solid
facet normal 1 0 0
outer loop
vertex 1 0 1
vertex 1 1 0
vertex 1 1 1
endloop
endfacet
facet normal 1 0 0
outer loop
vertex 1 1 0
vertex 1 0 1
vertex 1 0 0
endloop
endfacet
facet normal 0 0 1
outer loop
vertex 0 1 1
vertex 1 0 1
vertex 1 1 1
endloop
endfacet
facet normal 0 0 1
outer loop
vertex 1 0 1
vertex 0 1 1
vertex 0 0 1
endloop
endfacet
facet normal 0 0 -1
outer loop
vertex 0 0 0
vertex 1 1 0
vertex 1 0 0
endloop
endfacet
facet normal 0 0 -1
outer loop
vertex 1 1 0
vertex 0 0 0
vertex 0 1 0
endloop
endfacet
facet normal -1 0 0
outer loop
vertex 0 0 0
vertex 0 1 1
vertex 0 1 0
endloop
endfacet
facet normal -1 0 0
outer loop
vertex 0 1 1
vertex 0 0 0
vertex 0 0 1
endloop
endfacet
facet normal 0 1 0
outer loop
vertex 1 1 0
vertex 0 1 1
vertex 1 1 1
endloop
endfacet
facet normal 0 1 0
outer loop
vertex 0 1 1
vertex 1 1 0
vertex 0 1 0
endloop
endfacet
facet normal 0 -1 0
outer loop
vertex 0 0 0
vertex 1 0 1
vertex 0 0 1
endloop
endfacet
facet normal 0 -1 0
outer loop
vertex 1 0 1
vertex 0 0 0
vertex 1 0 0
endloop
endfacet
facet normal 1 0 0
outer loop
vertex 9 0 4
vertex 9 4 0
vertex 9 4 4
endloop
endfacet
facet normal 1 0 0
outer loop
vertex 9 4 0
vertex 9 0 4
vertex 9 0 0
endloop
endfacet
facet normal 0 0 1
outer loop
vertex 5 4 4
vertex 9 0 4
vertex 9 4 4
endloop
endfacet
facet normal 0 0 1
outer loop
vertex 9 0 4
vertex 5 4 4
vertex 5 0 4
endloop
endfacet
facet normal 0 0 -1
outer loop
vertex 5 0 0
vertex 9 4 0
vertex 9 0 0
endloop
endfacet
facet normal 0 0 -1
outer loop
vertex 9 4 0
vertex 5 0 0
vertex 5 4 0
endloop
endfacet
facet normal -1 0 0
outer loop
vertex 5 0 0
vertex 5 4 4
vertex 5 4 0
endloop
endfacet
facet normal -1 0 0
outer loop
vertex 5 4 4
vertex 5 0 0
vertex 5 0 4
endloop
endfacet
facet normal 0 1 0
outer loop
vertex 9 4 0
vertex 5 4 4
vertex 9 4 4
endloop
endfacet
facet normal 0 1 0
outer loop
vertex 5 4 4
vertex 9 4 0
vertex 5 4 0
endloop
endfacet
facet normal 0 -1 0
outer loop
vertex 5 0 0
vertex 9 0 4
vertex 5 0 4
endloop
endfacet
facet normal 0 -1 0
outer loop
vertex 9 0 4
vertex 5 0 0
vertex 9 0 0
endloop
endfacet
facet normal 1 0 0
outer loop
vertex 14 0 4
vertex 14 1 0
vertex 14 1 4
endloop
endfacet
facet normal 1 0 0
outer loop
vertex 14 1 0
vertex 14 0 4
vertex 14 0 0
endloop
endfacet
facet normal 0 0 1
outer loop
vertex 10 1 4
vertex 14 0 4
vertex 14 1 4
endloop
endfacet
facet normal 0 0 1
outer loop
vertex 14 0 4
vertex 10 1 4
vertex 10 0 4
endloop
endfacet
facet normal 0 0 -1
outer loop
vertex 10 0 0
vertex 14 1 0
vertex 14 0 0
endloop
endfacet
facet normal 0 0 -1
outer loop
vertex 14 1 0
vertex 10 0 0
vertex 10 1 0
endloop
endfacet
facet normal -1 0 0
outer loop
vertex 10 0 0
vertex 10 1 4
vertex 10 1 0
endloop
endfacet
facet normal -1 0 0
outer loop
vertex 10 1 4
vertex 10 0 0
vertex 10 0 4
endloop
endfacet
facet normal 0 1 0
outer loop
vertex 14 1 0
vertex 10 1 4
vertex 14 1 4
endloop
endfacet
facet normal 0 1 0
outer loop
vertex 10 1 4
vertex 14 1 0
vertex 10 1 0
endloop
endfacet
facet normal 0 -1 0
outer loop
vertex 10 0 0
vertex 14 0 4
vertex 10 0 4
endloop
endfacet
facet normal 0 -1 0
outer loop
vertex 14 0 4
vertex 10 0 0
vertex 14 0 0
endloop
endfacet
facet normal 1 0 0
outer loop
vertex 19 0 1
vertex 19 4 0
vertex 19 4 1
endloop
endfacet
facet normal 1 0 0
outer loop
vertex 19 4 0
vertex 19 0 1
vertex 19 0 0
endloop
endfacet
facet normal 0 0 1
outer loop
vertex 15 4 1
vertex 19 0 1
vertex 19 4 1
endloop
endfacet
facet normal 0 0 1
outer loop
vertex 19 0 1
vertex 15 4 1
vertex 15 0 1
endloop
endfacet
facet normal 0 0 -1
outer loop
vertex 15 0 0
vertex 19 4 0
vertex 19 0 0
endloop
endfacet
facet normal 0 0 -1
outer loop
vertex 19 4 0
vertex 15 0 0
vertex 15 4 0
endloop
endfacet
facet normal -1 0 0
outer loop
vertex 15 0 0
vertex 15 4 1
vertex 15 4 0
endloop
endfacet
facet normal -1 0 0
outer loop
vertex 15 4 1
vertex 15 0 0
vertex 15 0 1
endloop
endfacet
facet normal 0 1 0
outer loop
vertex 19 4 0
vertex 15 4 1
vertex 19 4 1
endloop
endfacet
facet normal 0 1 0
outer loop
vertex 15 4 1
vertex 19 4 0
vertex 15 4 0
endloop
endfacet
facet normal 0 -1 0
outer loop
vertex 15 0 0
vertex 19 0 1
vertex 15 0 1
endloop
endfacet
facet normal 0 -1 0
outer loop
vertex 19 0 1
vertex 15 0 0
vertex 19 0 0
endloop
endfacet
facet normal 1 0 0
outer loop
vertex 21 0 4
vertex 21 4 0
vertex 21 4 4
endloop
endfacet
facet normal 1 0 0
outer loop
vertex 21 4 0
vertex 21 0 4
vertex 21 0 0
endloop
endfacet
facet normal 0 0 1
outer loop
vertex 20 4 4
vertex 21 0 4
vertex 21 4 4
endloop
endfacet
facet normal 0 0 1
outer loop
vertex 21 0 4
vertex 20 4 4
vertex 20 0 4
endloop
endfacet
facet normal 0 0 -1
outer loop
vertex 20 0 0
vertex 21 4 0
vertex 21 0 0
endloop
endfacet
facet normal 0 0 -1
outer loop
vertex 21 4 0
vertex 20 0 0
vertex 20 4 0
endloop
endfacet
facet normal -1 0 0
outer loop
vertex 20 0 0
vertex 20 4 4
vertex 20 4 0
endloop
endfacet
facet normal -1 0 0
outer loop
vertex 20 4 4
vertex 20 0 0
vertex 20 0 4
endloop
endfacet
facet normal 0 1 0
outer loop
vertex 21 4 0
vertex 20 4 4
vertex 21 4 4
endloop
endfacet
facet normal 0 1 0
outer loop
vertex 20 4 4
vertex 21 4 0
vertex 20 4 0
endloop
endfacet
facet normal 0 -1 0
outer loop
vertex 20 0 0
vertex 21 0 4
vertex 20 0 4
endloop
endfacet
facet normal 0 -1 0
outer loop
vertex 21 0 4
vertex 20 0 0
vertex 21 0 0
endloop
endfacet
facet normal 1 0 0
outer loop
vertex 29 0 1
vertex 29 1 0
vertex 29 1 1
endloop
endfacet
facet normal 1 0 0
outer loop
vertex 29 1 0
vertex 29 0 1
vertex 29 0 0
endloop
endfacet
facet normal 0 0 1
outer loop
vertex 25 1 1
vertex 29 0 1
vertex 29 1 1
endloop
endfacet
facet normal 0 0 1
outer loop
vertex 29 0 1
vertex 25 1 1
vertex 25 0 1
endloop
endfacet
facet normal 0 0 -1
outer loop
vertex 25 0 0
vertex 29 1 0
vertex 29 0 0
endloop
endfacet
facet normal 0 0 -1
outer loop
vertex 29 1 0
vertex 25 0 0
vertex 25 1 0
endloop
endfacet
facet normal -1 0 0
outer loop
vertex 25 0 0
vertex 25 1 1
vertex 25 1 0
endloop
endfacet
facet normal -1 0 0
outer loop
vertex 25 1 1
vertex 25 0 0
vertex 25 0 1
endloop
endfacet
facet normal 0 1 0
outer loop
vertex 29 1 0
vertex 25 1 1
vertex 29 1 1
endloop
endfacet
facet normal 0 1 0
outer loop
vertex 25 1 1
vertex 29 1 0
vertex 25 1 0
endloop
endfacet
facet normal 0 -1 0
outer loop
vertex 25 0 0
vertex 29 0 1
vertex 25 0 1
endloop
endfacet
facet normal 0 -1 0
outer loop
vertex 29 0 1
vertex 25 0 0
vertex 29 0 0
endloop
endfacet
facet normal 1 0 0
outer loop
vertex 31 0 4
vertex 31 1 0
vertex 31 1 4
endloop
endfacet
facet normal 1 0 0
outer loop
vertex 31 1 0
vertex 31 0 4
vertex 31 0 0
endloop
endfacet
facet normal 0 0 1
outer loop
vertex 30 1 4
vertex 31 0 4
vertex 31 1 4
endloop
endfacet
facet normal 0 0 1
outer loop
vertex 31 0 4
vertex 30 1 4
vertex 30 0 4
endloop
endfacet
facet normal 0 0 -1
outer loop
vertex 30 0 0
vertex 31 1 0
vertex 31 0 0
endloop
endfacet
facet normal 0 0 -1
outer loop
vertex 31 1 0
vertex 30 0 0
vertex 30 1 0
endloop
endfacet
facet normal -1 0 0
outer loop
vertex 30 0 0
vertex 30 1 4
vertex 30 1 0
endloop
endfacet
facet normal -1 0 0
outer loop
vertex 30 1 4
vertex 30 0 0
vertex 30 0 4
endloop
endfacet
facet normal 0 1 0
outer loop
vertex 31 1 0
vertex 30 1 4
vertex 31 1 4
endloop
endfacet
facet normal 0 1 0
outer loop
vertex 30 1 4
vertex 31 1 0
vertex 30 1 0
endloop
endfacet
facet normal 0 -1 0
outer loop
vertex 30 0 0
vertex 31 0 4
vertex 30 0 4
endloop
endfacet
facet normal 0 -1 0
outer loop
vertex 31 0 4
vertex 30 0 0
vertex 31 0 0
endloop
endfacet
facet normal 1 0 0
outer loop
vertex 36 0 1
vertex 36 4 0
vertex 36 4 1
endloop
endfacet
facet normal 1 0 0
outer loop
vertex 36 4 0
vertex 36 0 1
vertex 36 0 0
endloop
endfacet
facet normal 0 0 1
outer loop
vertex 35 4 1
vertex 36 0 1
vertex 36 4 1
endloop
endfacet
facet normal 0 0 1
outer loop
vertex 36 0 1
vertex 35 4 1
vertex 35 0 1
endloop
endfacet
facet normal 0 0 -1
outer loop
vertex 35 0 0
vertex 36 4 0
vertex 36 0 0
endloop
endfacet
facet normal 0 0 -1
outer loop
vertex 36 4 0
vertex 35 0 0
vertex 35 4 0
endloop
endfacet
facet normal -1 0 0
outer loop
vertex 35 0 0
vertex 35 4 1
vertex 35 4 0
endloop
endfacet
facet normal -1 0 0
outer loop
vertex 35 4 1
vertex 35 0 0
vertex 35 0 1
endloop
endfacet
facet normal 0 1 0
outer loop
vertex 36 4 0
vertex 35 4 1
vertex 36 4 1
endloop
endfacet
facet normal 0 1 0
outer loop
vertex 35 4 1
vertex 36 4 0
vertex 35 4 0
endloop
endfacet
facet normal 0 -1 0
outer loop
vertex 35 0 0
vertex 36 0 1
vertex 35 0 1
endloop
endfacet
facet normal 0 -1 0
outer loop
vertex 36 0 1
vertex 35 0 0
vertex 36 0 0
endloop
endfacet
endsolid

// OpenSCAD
cube(1);

translate([5,0,0])
cube(4);

translate([10,0,0])
cube([4,1,4]);

translate([15,0,0])
cube([4,4,1]);

translate([20,0,0])
cube([1,4,4]);

translate([25,0,0])
cube([4,1,1]);

translate([30,0,0])
cube([1,1,4]);

translate([35,0,0])
cube([1,4,1]);
